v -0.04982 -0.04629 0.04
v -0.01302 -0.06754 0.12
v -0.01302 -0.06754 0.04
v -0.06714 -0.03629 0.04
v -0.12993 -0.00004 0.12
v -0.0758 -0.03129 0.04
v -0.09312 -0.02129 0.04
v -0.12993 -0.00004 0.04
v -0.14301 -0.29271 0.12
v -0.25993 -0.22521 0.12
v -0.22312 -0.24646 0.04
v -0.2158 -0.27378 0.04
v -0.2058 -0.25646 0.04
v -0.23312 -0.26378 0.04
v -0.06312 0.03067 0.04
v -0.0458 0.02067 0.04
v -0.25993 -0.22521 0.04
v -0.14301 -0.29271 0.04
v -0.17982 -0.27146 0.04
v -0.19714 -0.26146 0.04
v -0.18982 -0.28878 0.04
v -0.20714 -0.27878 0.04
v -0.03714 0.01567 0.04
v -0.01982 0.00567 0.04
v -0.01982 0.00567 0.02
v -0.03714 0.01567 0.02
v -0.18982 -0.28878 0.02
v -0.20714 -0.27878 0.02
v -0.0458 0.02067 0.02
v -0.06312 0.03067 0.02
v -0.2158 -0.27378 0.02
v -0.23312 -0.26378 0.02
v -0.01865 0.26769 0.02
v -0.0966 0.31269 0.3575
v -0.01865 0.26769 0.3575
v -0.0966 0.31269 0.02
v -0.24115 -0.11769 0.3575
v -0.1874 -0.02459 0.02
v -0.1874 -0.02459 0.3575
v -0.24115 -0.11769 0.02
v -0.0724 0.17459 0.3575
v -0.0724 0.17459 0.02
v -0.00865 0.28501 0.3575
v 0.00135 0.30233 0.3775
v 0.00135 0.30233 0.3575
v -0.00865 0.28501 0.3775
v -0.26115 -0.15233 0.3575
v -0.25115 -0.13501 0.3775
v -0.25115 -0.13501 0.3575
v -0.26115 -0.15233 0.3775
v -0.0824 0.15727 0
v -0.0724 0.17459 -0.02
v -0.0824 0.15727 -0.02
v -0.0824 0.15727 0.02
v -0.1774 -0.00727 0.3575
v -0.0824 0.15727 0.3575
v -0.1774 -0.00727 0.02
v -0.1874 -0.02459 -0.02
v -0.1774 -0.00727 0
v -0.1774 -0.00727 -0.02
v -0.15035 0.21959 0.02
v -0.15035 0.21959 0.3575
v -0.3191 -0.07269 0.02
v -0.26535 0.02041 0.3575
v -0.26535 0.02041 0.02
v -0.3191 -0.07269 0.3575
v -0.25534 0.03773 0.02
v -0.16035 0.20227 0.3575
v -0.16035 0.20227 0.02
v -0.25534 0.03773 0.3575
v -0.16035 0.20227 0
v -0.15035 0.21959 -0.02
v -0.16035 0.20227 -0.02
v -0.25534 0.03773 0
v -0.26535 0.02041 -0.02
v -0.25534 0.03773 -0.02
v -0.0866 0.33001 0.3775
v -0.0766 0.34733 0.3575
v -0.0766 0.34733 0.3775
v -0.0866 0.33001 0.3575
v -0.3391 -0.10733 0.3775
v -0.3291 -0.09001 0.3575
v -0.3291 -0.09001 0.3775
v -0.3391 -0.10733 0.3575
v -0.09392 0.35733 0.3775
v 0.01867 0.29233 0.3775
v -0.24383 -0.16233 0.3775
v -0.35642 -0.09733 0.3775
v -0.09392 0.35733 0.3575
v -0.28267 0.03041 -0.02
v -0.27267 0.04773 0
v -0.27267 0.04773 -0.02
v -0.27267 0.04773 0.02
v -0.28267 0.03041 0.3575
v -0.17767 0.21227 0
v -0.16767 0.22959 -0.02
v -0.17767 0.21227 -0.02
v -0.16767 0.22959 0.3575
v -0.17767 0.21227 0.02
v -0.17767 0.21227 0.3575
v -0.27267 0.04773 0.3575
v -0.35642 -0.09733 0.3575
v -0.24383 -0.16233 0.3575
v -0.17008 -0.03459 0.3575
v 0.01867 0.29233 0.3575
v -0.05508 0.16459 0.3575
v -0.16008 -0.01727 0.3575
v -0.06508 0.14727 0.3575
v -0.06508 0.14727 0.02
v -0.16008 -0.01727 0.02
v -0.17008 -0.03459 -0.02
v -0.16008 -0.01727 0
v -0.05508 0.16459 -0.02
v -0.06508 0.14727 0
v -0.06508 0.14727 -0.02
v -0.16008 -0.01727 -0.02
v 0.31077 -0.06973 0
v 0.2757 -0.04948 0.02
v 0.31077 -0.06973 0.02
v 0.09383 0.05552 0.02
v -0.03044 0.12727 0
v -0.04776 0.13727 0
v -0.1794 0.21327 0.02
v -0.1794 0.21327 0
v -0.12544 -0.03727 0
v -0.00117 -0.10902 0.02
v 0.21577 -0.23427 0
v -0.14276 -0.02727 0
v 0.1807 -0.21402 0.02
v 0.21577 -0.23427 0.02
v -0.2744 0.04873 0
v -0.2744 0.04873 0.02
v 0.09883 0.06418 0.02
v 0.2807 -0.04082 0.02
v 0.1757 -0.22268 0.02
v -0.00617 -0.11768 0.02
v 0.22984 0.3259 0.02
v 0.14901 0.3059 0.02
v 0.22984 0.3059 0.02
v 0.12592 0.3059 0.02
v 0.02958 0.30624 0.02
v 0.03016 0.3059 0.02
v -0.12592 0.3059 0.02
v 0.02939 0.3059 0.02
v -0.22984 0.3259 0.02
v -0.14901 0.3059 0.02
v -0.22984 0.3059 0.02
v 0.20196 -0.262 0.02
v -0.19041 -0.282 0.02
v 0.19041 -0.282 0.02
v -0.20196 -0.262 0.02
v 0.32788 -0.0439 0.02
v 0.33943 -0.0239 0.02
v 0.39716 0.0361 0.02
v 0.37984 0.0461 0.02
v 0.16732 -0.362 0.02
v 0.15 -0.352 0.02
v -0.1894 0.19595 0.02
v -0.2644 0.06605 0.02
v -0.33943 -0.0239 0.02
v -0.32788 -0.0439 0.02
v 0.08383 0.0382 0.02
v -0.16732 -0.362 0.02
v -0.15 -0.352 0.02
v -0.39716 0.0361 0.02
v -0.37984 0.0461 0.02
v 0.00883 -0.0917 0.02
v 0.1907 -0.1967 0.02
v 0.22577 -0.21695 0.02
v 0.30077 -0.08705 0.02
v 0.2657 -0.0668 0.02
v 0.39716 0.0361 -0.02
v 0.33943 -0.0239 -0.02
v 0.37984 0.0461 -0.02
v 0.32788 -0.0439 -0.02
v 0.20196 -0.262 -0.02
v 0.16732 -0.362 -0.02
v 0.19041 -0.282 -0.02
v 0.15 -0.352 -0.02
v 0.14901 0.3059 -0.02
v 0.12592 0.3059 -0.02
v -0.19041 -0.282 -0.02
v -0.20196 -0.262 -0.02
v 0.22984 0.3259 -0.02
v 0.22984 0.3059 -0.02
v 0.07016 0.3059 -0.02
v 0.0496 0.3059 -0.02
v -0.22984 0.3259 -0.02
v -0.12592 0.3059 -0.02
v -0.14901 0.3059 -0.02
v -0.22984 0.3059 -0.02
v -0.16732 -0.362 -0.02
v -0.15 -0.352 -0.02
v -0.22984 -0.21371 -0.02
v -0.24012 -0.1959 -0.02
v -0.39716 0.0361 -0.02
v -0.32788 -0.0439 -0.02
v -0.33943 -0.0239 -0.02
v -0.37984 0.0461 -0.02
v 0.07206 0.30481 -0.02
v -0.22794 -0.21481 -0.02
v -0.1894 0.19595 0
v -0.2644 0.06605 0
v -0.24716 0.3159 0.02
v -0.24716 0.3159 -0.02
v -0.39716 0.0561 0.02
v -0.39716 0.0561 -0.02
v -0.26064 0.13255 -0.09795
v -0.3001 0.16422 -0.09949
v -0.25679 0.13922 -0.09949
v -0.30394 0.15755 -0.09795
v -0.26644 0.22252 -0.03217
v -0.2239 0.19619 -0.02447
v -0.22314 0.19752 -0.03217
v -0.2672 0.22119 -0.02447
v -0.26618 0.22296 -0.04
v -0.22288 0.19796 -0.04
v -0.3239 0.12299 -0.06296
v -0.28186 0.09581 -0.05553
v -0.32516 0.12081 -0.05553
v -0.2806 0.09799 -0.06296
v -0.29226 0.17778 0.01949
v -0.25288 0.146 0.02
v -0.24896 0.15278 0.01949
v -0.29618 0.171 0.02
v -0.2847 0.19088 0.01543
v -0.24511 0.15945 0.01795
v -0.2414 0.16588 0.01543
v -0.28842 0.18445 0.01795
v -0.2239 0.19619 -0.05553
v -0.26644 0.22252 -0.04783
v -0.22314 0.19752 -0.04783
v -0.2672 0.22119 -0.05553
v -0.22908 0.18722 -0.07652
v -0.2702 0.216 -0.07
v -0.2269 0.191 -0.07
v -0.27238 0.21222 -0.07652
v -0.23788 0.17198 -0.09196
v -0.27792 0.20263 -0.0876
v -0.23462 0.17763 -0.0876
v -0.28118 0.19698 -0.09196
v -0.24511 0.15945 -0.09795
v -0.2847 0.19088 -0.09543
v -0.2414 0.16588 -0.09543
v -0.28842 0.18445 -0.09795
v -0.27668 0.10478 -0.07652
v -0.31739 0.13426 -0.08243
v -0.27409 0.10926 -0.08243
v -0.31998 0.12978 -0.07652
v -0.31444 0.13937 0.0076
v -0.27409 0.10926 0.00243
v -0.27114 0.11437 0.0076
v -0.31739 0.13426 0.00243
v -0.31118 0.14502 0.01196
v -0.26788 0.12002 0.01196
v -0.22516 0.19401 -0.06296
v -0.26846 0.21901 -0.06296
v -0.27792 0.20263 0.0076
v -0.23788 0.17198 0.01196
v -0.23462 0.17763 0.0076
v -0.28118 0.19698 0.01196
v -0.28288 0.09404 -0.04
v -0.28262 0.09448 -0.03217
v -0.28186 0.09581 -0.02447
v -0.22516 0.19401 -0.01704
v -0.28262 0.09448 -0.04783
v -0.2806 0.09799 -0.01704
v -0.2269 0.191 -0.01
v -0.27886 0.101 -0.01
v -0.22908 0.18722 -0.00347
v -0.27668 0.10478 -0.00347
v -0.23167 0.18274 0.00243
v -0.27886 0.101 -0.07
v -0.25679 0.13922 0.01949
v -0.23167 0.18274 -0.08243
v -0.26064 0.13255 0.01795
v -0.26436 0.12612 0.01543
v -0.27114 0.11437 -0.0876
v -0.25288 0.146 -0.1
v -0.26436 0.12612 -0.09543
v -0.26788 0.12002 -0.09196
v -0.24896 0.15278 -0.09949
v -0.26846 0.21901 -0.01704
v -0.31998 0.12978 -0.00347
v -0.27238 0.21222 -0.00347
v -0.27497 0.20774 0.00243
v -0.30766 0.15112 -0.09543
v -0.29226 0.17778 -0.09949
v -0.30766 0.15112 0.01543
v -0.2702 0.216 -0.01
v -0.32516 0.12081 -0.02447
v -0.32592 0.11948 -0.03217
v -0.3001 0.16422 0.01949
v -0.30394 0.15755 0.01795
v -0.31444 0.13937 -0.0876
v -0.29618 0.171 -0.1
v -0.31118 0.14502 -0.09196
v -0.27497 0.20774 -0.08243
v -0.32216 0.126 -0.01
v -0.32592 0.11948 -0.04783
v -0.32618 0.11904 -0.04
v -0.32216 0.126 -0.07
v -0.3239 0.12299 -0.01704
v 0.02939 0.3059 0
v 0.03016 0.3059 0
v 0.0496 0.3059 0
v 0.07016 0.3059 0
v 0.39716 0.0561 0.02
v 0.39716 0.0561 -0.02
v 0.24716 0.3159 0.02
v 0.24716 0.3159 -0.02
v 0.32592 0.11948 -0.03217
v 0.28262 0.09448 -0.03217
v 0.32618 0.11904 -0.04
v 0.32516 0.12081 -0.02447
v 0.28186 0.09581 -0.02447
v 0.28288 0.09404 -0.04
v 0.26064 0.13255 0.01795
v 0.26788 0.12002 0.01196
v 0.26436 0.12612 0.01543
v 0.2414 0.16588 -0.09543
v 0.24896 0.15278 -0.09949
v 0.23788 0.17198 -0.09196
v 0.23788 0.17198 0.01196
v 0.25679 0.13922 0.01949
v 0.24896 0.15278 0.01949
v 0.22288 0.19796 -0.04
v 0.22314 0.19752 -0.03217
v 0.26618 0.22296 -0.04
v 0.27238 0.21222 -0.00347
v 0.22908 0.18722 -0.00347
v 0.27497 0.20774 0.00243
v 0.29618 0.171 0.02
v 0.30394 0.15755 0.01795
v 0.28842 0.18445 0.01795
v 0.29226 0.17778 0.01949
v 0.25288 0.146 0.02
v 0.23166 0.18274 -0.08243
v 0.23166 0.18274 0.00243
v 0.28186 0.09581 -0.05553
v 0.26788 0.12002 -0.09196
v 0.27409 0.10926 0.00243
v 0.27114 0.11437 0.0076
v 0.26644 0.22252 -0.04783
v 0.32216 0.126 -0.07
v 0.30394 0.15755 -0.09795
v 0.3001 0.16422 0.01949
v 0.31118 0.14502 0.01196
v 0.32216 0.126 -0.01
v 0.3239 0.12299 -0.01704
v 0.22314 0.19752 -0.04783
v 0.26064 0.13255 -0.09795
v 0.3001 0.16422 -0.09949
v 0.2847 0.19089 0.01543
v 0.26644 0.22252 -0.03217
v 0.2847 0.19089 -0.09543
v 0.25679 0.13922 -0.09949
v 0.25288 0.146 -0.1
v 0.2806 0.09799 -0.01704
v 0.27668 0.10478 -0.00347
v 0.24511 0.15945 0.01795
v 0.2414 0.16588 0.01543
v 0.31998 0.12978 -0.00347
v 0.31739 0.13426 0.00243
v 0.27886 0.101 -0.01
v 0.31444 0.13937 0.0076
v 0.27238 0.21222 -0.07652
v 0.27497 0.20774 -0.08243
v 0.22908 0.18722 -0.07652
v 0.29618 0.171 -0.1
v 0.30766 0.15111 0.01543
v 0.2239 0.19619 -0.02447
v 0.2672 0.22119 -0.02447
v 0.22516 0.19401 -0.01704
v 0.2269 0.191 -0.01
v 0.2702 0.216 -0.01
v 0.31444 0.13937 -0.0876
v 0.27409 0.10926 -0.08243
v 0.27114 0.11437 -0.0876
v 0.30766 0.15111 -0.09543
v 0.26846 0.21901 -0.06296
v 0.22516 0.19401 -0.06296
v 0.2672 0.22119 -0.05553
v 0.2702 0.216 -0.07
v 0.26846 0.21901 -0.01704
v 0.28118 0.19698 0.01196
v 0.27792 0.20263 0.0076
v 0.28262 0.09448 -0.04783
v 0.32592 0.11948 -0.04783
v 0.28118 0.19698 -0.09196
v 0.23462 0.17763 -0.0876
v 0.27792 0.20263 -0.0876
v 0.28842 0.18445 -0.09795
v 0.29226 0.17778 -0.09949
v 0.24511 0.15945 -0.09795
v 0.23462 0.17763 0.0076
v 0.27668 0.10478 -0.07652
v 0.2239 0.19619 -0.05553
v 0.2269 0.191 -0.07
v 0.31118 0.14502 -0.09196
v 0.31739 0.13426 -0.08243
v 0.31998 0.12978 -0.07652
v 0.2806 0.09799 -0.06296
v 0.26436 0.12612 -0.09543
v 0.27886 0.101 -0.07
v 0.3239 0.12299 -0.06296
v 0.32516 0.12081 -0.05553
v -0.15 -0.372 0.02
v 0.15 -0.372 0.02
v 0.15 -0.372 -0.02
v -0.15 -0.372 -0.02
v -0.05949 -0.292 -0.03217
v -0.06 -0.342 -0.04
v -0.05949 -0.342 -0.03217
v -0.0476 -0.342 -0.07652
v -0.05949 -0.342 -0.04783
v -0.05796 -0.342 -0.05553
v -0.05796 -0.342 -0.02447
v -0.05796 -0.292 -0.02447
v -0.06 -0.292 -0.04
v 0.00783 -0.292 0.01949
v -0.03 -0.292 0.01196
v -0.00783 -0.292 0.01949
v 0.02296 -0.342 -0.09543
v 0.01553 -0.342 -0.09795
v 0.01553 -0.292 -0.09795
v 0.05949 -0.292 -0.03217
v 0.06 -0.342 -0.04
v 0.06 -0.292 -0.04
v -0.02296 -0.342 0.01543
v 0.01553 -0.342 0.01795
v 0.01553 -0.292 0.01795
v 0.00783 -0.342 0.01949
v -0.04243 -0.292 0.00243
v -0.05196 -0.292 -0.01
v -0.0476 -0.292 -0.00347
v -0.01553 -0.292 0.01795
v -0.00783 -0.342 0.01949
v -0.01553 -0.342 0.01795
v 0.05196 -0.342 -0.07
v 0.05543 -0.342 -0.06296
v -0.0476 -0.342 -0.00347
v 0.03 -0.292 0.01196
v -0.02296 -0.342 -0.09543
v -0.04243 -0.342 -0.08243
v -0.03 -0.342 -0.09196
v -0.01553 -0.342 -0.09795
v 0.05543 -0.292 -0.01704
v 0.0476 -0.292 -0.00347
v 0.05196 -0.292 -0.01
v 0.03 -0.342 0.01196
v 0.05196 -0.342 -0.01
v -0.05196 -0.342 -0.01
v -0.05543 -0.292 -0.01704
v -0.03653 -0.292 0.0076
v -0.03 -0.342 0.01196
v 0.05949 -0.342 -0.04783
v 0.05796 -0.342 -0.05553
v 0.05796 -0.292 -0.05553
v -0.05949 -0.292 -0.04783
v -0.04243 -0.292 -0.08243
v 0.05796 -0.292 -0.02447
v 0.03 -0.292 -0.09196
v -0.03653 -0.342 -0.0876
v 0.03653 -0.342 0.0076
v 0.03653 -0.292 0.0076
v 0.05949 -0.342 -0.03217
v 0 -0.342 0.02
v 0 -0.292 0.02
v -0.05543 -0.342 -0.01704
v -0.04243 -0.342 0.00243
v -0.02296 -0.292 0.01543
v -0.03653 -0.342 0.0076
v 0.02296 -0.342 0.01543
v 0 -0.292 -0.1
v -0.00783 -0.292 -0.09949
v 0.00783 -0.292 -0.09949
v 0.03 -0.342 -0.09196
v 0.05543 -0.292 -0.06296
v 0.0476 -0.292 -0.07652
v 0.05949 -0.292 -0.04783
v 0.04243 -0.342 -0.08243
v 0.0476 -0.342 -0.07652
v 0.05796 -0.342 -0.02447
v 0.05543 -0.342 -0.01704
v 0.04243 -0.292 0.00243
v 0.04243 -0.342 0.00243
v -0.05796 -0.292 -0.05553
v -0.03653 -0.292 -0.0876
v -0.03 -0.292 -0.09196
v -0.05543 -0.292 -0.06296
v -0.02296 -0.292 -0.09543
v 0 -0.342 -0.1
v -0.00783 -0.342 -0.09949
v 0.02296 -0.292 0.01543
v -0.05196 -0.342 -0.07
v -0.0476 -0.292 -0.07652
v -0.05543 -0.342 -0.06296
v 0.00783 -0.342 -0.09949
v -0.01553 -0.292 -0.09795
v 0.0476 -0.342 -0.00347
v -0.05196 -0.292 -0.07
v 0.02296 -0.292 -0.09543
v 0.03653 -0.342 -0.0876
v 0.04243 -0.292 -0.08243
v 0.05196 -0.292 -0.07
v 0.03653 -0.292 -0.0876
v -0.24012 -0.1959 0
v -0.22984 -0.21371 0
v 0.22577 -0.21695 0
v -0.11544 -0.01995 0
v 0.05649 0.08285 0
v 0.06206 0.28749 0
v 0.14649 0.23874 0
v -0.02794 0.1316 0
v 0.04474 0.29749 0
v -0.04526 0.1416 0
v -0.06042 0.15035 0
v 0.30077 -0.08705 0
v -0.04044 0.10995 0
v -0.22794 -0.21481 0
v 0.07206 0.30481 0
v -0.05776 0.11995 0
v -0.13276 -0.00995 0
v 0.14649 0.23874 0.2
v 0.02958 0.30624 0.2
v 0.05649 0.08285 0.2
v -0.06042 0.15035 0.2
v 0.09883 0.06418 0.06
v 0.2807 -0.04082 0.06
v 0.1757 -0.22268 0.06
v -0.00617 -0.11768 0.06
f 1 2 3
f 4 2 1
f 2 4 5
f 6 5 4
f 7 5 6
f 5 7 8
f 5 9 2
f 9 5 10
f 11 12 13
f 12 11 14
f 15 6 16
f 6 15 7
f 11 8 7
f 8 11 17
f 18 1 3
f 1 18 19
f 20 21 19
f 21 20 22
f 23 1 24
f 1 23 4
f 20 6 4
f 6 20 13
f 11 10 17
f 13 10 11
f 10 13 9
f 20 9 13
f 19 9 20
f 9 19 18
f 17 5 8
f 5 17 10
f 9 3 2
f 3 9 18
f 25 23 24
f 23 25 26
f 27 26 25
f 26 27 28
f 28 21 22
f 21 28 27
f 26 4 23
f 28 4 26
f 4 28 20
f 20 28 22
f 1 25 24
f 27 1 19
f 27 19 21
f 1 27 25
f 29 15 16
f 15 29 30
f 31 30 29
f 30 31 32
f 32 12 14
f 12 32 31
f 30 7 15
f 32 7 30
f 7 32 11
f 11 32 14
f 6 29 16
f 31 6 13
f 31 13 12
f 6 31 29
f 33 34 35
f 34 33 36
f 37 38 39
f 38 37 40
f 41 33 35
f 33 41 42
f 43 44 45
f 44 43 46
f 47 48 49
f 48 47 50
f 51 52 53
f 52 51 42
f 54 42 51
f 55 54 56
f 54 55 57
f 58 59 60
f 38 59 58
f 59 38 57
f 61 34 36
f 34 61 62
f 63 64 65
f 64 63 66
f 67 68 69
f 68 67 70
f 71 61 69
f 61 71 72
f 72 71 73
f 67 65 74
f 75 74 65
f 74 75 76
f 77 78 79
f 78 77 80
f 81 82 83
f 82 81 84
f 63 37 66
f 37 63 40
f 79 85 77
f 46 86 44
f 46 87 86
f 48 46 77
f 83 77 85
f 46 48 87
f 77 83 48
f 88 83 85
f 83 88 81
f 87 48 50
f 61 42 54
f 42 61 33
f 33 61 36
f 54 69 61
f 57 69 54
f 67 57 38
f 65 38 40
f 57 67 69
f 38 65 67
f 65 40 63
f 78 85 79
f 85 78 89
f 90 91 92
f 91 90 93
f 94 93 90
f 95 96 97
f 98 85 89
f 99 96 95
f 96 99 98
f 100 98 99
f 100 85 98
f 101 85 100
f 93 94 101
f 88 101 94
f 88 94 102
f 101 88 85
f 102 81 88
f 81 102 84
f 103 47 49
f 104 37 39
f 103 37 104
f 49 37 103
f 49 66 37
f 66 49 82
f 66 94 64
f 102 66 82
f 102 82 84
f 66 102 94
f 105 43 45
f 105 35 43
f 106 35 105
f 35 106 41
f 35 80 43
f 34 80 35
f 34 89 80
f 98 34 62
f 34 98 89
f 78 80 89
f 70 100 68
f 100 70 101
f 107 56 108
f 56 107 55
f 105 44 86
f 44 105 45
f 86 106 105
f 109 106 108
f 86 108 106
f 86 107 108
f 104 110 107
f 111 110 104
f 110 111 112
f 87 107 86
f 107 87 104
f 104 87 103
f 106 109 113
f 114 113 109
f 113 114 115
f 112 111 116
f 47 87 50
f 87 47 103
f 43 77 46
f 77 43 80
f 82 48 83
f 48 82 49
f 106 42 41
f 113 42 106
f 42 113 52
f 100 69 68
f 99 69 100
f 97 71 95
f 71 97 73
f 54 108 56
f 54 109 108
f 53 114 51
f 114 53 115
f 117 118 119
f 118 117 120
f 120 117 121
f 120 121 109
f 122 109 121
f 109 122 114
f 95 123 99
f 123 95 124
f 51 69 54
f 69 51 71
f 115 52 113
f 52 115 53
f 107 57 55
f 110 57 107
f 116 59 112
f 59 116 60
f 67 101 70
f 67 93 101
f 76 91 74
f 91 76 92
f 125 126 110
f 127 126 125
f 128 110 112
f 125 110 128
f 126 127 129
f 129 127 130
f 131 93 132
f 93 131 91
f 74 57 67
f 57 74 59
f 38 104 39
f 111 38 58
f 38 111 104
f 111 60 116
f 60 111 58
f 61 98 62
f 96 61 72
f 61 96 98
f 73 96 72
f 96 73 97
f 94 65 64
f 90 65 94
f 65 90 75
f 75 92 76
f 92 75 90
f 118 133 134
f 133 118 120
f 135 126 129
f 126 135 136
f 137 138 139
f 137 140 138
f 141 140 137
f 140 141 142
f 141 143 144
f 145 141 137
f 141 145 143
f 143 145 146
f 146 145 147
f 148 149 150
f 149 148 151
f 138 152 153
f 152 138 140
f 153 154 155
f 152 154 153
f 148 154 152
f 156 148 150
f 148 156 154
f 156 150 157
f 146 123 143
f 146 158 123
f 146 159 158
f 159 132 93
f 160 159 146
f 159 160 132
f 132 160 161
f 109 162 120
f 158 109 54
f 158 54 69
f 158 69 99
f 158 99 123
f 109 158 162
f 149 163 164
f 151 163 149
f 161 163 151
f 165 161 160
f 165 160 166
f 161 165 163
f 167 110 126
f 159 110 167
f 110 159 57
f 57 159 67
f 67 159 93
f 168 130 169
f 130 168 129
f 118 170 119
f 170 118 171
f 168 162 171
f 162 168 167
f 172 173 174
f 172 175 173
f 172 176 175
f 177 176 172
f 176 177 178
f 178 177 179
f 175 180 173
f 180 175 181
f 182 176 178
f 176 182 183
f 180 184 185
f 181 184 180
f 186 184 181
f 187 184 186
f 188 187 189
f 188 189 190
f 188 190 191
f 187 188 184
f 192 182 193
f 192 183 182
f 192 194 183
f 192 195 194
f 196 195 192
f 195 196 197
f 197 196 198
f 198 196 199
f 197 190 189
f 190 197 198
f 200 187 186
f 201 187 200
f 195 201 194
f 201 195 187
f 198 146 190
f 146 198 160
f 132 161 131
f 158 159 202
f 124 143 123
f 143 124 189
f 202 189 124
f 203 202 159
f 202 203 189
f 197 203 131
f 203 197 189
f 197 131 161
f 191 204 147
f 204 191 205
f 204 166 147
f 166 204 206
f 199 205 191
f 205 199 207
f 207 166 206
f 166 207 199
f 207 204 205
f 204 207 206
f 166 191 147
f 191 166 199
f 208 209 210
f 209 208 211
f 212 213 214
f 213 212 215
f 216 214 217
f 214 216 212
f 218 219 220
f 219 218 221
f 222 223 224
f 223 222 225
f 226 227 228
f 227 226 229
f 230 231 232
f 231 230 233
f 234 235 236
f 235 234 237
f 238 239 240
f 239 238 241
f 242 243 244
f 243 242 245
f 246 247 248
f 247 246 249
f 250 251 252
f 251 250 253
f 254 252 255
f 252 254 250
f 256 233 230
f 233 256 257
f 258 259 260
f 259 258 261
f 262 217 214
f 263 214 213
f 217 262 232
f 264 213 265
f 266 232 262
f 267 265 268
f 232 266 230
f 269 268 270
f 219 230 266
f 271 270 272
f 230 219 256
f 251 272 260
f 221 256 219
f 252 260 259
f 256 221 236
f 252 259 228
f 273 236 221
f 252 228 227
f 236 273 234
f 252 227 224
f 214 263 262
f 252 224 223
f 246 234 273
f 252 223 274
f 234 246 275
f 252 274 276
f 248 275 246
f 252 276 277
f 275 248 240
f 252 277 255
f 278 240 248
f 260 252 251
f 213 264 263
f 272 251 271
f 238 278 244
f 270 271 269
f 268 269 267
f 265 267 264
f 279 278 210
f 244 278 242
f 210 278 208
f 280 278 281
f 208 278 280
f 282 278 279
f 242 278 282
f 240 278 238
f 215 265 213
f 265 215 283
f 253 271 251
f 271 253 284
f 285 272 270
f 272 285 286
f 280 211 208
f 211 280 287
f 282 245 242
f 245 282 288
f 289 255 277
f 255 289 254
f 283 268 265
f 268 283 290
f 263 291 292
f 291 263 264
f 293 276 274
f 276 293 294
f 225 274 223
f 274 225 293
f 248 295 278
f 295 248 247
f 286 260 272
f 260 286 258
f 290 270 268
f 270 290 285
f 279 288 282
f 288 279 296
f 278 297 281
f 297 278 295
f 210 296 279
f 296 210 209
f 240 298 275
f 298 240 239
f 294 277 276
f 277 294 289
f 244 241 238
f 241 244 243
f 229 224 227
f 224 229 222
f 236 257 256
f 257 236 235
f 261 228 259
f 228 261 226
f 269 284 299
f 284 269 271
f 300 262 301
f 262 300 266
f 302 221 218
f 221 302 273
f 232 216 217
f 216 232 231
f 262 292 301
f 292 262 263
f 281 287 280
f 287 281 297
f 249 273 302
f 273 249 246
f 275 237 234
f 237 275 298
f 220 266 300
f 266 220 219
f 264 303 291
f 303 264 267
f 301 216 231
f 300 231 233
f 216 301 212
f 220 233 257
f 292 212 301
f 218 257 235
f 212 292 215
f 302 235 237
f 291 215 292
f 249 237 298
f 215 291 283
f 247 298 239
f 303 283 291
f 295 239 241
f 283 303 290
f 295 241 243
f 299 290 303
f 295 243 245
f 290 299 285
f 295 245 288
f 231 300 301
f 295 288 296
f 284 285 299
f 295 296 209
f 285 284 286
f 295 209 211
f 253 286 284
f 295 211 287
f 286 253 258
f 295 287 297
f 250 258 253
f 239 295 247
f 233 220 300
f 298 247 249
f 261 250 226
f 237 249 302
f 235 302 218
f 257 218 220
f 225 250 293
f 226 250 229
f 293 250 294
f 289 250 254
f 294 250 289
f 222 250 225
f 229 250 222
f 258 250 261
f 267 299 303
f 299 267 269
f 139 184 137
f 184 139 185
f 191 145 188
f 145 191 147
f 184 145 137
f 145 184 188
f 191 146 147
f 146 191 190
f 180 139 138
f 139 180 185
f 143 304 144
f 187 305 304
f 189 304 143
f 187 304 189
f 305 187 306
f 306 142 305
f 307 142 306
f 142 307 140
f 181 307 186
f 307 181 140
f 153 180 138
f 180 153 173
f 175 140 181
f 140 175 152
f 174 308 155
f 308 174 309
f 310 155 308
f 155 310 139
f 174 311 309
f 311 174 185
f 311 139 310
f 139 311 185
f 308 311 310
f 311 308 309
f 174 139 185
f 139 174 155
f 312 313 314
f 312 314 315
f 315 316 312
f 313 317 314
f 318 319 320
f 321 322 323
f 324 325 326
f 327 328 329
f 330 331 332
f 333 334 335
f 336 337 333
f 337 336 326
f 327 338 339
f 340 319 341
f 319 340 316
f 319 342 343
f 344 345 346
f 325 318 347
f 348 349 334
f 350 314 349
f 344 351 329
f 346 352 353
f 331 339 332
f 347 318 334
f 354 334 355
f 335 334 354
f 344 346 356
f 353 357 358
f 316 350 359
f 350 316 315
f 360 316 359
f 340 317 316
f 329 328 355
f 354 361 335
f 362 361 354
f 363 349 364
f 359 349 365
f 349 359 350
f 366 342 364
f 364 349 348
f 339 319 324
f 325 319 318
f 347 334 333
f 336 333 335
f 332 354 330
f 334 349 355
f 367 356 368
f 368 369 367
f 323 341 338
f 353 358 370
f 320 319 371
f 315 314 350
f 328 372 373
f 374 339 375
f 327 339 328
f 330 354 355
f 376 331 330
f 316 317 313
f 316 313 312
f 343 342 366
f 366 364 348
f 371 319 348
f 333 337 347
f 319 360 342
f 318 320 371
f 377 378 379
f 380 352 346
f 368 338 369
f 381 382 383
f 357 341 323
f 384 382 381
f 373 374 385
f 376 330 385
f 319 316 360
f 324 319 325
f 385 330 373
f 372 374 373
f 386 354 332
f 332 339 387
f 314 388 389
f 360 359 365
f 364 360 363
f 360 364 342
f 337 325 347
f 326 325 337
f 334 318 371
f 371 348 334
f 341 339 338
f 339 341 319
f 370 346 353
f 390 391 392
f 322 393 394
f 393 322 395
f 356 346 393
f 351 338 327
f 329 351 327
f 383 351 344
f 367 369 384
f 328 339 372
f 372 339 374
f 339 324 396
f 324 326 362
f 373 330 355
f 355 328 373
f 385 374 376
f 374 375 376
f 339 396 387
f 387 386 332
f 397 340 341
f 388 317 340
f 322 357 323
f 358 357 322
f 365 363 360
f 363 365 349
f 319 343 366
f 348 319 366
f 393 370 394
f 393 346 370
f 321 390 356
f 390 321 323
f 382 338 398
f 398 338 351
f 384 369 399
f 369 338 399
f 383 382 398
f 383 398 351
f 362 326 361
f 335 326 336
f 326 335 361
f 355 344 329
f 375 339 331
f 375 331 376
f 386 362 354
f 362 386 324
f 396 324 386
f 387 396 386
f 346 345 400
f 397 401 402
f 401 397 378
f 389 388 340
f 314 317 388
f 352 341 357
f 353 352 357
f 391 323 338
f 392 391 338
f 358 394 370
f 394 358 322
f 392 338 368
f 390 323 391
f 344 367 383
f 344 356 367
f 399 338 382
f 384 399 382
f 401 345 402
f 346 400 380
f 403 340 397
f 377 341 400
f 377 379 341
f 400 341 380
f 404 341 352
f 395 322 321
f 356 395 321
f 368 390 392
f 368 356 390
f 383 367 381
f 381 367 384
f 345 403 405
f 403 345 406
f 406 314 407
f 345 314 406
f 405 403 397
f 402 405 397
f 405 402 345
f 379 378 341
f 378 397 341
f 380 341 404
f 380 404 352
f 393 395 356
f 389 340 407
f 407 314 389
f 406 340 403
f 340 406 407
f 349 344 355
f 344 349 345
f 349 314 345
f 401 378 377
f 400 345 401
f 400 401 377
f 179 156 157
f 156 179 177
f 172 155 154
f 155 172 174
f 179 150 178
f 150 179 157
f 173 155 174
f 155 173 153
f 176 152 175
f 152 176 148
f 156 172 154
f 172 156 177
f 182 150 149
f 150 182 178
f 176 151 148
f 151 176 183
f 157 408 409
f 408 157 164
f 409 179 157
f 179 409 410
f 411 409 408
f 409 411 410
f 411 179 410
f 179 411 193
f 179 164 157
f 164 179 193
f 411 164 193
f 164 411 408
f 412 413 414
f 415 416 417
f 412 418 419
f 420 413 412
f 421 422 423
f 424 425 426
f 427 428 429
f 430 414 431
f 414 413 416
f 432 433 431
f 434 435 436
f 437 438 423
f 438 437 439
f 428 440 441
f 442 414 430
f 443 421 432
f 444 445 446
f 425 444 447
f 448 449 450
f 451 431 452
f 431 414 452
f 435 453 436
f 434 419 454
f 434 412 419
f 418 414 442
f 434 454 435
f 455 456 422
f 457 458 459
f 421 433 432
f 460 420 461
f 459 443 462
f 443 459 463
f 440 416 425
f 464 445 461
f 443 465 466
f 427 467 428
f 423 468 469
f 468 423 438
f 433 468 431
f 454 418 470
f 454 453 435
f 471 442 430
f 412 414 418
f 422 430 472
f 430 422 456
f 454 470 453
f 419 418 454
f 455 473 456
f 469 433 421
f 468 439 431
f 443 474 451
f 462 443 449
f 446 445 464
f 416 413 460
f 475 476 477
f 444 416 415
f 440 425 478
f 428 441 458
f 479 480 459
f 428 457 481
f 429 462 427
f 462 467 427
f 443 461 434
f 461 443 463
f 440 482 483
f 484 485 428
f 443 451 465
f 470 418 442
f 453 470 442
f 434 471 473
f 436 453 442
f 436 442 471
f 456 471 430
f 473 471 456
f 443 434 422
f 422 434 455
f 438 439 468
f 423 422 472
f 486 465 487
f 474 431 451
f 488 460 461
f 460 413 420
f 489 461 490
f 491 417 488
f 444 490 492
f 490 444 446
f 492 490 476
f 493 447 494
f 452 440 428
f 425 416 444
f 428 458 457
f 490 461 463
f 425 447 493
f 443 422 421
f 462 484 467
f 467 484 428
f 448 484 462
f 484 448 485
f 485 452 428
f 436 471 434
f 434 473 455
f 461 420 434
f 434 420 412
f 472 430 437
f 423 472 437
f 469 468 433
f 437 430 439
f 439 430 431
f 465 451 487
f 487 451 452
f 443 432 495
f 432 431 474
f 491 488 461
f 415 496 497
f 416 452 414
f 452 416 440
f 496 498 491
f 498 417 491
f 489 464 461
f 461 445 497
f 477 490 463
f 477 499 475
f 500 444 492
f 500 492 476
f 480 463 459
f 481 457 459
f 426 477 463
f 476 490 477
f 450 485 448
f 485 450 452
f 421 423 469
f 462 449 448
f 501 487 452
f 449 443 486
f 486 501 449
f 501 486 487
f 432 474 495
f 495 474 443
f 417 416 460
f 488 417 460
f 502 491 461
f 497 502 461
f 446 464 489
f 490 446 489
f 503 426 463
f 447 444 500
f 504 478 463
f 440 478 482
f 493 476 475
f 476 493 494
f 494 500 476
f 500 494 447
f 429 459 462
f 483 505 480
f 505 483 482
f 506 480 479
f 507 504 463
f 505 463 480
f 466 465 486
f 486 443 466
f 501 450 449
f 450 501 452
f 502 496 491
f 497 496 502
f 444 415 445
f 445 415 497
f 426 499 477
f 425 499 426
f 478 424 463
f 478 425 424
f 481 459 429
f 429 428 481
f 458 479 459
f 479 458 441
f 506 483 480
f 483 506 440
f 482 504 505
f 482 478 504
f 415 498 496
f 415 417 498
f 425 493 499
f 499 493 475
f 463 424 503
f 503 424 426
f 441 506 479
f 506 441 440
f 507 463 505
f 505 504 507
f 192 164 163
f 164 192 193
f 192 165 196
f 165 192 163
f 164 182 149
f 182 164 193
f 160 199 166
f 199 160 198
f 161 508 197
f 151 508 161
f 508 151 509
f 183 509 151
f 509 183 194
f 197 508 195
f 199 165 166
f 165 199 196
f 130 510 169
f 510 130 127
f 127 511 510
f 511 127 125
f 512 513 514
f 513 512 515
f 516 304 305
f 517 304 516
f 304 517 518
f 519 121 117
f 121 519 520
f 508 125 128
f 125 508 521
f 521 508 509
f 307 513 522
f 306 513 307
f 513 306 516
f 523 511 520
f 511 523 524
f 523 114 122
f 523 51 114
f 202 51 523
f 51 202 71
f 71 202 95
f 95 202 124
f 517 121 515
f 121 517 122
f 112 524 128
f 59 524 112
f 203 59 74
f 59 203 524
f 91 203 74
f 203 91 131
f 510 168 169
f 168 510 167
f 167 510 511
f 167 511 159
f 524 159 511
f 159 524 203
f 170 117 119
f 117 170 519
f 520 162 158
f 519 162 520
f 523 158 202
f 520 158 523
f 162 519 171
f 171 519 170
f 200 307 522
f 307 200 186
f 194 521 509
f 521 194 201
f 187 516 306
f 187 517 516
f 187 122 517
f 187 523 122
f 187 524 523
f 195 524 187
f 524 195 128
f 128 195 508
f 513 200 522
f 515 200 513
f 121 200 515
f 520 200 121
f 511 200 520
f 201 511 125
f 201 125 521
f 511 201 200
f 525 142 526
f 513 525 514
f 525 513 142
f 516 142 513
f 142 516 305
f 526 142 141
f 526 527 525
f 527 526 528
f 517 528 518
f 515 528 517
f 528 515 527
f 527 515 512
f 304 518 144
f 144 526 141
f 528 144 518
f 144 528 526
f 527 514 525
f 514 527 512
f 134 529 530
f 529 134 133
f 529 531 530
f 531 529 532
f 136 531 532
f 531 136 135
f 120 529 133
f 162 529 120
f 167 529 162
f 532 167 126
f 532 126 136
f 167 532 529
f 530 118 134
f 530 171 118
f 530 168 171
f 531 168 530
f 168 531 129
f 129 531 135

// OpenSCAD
// Generated by SolidPython 1.1.3 on 2024-01-29 12:17:45
$fn = 48;


union() {
	rotate(a = [0, 0, 60]) {
		union() {
			color(alpha = 1.0000000000, c = "Red") {
				translate(v = [0.   ,0.272,0.   ]) {
					rotate(a = [0, 0, -0.0000000000]) {
						cube(center = true, size = [0.41547005383792507, 0.0200000000, 0.0400000000]);
					}
				}
			}
		}
		union() {
			color(alpha = 1.0000000000, c = "Orange") {
				translate(v = [0.   ,0.362,0.   ]) {
					rotate(a = [0, 0, -0.0000000000]) {
						cube(center = true, size = [0.3000000000, 0.0200000000, 0.0400000000]);
					}
				}
			}
		}
		union() {
			color(alpha = 1.0000000000, c = "Green") {
				translate(v = [ 0.   , 0.317,-0.04 ]) {
					rotate(a = [90, 0, -0.0000000000]) {
						cylinder(center = true, h = 0.0500000000, r = 0.0600000000);
					}
				}
			}
		}
		union() {
			color(alpha = 1.0000000000, c = "Purple") {
				translate(v = [0.27358073,0.15795191,0.        ]) {
					rotate(a = [0, 0, -60.0000000000]) {
						cube(center = true, size = [0.4596818842642447, 0.0200000000, 0.0400000000]);
					}
				}
			}
		}
		union() {
			color(alpha = 1.0000000000, c = "Red") {
				translate(v = [ 0.23555891,-0.136     , 0.        ]) {
					rotate(a = [0, 0, -120.0000000000]) {
						cube(center = true, size = [0.41547005383792507, 0.0200000000, 0.0400000000]);
					}
				}
			}
		}
		union() {
			color(alpha = 1.0000000000, c = "Orange") {
				translate(v = [ 0.3135012,-0.181    , 0.       ]) {
					rotate(a = [0, 0, -120.0000000000]) {
						cube(center = true, size = [0.3000000000, 0.0200000000, 0.0400000000]);
					}
				}
			}
		}
		union() {
			color(alpha = 1.0000000000, c = "Green") {
				translate(v = [ 0.27453005,-0.1585    ,-0.04      ]) {
					rotate(a = [90, 0, -120.0000000000]) {
						cylinder(center = true, h = 0.0500000000, r = 0.0600000000);
					}
				}
			}
		}
		union() {
			color(alpha = 1.0000000000, c = "Purple") {
				translate(v = [ 3.86870590e-17,-3.15903811e-01, 0.00000000e+00]) {
					rotate(a = [0, 0, -180.0000000000]) {
						cube(center = true, size = [0.4596818842642447, 0.0200000000, 0.0400000000]);
					}
				}
			}
		}
		union() {
			color(alpha = 1.0000000000, c = "Red") {
				translate(v = [-0.23555891,-0.136     , 0.        ]) {
					rotate(a = [0, 0, -240.0000000000]) {
						cube(center = true, size = [0.41547005383792507, 0.0200000000, 0.0400000000]);
					}
				}
			}
		}
		union() {
			color(alpha = 1.0000000000, c = "Orange") {
				translate(v = [-0.3135012,-0.181    , 0.       ]) {
					rotate(a = [0, 0, -240.0000000000]) {
						cube(center = true, size = [0.3000000000, 0.0200000000, 0.0400000000]);
					}
				}
			}
		}
		union() {
			color(alpha = 1.0000000000, c = "Green") {
				translate(v = [-0.27453005,-0.1585    ,-0.04      ]) {
					rotate(a = [90, 0, -240.0000000000]) {
						cylinder(center = true, h = 0.0500000000, r = 0.0600000000);
					}
				}
			}
		}
		union() {
			color(alpha = 1.0000000000, c = "Purple") {
				translate(v = [-0.27358073, 0.15795191, 0.        ]) {
					rotate(a = [0, 0, -300.0000000000]) {
						cube(center = true, size = [0.4596818842642447, 0.0200000000, 0.0400000000]);
					}
				}
			}
		}
		union() {
			color(alpha = 1.0000000000, c = "Blue") {
				translate(v = [-0.0850000000, -0.0200000000, 0.0100000000]) {
					rotate(a = [0, 0, -90]) {
						cube(center = true, size = [0.5680000000, 0.0200000000, 0.0200000000]);
					}
				}
			}
		}
		union() {
			color(alpha = 1.0000000000, c = "Blue") {
				translate(v = [0.0850000000, -0.0200000000, 0.0100000000]) {
					rotate(a = [0, 0, -90]) {
						cube(center = true, size = [0.5680000000, 0.0200000000, 0.0200000000]);
					}
				}
			}
		}
		union() {
			color(alpha = 1.0000000000, c = "Blue") {
				translate(v = [0, 0.1000000000, -0.0100000000]) {
					cube(center = true, size = [0.6000000000, 0.0200000000, 0.0200000000]);
				}
			}
		}
		union() {
			color(alpha = 1.0000000000, c = "Yellow") {
				translate(v = [0.1900000000, 0.0600000000, 0.1000000000]) {
					cube(center = true, size = [0.1800000000, 0.1350000000, 0.2000000000]);
				}
			}
		}
		translate(v = [-0.0550000000, 0.1950000000, 0.0800000000]) {
			rotate(a = [0, 0, 0]) {
				translate(v = [-0.1000000000, -0.1500000000, 0.0000000000]) {
					union() {
						color(alpha = 1.0000000000, c = "Green") {
							translate(v = [-0.0400000000, 0, 0]) {
								cube(center = true, size = [0.2600000000, 0.1350000000, 0.0800000000]);
							}
						}
						color(alpha = 1.0000000000, c = "Blue") {
							translate(v = [-0.0200000000, -0.0150000000, -0.0500000000]) {
								cube(center = true, size = [0.3400000000, 0.0200000000, 0.0200000000]);
							}
						}
						color(alpha = 1.0000000000, c = "Blue") {
							translate(v = [-0.0200000000, 0.0150000000, -0.0500000000]) {
								cube(center = true, size = [0.3400000000, 0.0200000000, 0.0200000000]);
							}
						}
					}
				}
			}
		}
		translate(v = [0, 0.1950000000, 0.1987500000]) {
			rotate(a = [90, 0, 0]) {
				union() {
					color(alpha = 1.0000000000, c = "Yellow") {
						cube(center = true, size = [0.4450000000, 0.3575000000, 0.0900000000]);
					}
					color(alpha = 1.0000000000, c = "Blue") {
						translate(v = [0, 0.1687500000, -0.0550000000]) {
							cube(center = true, size = [0.5250000000, 0.0200000000, 0.0200000000]);
						}
					}
					color(alpha = 1.0000000000, c = "Blue") {
						translate(v = [0, 0.1687500000, 0.0550000000]) {
							cube(center = true, size = [0.5250000000, 0.0200000000, 0.0200000000]);
						}
					}
					color(alpha = 1.0000000000, c = "Blue") {
						translate(v = [0.2325000000, 0.1687500000]) {
							cube(center = true, size = [0.0200000000, 0.0200000000, 0.0900000000]);
						}
					}
					color(alpha = 1.0000000000, c = "Blue") {
						translate(v = [-0.2325000000, 0.1687500000]) {
							cube(center = true, size = [0.0200000000, 0.0200000000, 0.0900000000]);
						}
					}
					color(alpha = 1.0000000000, c = "Blue") {
						translate(v = [0.1050000000, -0.0300000000, 0.0550000000]) {
							cube(center = true, size = [0.0200000000, 0.3775000000, 0.0200000000]);
						}
					}
					color(alpha = 1.0000000000, c = "Blue") {
						translate(v = [-0.1050000000, -0.0300000000, 0.0550000000]) {
							cube(center = true, size = [0.0200000000, 0.3775000000, 0.0200000000]);
						}
					}
					color(alpha = 1.0000000000, c = "Blue") {
						translate(v = [0.1050000000, -0.0300000000, -0.0550000000]) {
							cube(center = true, size = [0.0200000000, 0.3775000000, 0.0200000000]);
						}
					}
					color(alpha = 1.0000000000, c = "Blue") {
						translate(v = [-0.1050000000, -0.0300000000, -0.0550000000]) {
							cube(center = true, size = [0.0200000000, 0.3775000000, 0.0200000000]);
						}
					}
				}
			}
		}
		color(alpha = 1.0000000000, c = "Orange") {
			translate(v = [ 0.    ,-0.1585, 0.04  ]) {
				cube(center = true, size = [0.2100000000, 0.2100000000, 0.0400000000]);
			}
		}
	}
}
/***********************************************
*********      SolidPython code:      **********
************************************************
 
#! /usr/bin/env python3
import sys
import numpy as np
from solid import scad_render_to_file
from solid.objects import cube, translate, union, rotate, color, cylinder
from armComponents2 import controlBox, powerInverter, robotBase

SEGMENTS = 48

radial_vector0 = np.array([31., -19., 0.])
radial_vector0 /= np.linalg.norm(radial_vector0)
radial_vector1 = np.array([-31., -19., 0.])
radial_vector1 /= np.linalg.norm(radial_vector1)

side_count = 3
step_angle = 360/side_count
step_angle_rad = np.deg2rad(step_angle)
rad_size = .3  # Length from center to outer wheel
piece_width = .02  # cm
hpw = piece_width*.5

wheel_gap = .09
ctiw = .352  # Center to inner wheel support
ctow = ctiw-wheel_gap  # Center to outer wheel support
wsl = .3  # Wheel support length

p1 = np.array([wsl*.5, ctiw, 0.])
p2 = np.array([np.sin(step_angle_rad), np.cos(step_angle_rad), 0.]) * ctiw - \
    np.array([np.sin(step_angle_rad+np.pi*.5),
             np.cos(step_angle_rad+np.pi*.5), 0.]) * wsl*.5
boll = np.linalg.norm(p1-p2)  # Big outer lines length
bolr = np.linalg.norm((p1+p2)*.5)  # Big outer lines rad length

# Inner inner wheel support
iiwsl = wsl+((wheel_gap+piece_width*.5) *
             np.tan((side_count*2-2)*np.pi/(side_count*2)-np.pi*.5))*2
print(iiwsl)


def rotate_vec(vec, angle):
    angle = np.deg2rad(angle)
    new_vec = np.copy(vec)
    new_vec[0] = vec[0] * np.cos(angle) - vec[1] * np.sin(angle)
    new_vec[1] = vec[0] * np.sin(angle) + vec[1] * np.cos(angle)
    return new_vec


def basic_geometry():

    shapes = []
    for i in range(side_count):
        dir_vector = np.array(
            [np.sin(i*step_angle_rad), np.cos(i*step_angle_rad), 0.])
        rot = -step_angle*i
        outer_wheel_support = union()(
            color("Red")(
                translate(dir_vector*(ctow+hpw))(
                    rotate((0, 0, rot))(
                        cube([iiwsl, piece_width, piece_width*2], center=True)))))
        shapes.append(outer_wheel_support)
        inner_wheel_support = union()(
            color("Orange")(
                translate(dir_vector*(ctiw+hpw))(
                    rotate((0, 0, rot))(
                        cube([wsl, piece_width, piece_width*2], center=True)))))
        shapes.append(inner_wheel_support)

        # Wheels
        wheel_pos = ((dir_vector*(ctow+hpw))+(dir_vector*(ctiw+hpw)))*.5
        wheel_pos[2] -= .04
        print(wheel_pos)
        wheel = union()(
            color("Green")(
                translate(wheel_pos)(
                    rotate((90, 0, rot))(
                        cylinder(r=.06, h=.05, center=True)))))
        shapes.append(wheel)

        dir_vector = np.array([np.sin(i*step_angle_rad+step_angle_rad*.5),
                              np.cos(i*step_angle_rad+step_angle_rad*.5), 0.])
        rot -= step_angle*.5
        big_outer_line = union()(
            color("Purple")(
                translate(dir_vector*(bolr+hpw))(
                    rotate((0, 0, rot))(
                        cube([boll, piece_width, piece_width*2], center=True)))))
        shapes.append(big_outer_line)

    vertical_bar1 = union()(
        color("Blue")(
            translate([-.085, -.02, .01])(
                rotate((0, 0, -90))(
                    cube([.568, piece_width, piece_width], center=True)))))
    shapes.append(vertical_bar1)

    vertical_bar2 = union()(
        color("Blue")(
            translate([.085, -.02, .01])(
                rotate((0, 0, -90))(
                    cube([.568, piece_width, piece_width], center=True)))))
    shapes.append(vertical_bar2)

    horizontal_bar = union()(
        color("Blue")(
            translate([0, .1, -.01])(
                cube([.6, piece_width, piece_width], center=True))))
    shapes.append(horizontal_bar)

    battery_pack = union()(
        color("Yellow")(
            translate([.19, .06, .1])(
                    cube([.18, .135, .2], center=True))))
    shapes.append(battery_pack)
    
    power_inverter = powerInverter()
    power_inverter = translate([-.055, .195, .02+.06])(power_inverter)
    shapes.append(power_inverter)
    
    control_box = controlBox()
    control_box = translate([0, .195, .02+.3575*.5])(rotate([90, 0, 0])(control_box))
    shapes.append(control_box)

    robot_base = robotBase()
    shapes.append(robot_base)

    return union()(rotate([0, 0, 60])(*shapes))


if __name__ == '__main__':
    out_dir = sys.argv[1] if len(sys.argv) > 1 else None

    a = basic_geometry()

    # Adding the file_header argument as shown allows you to change
    # the detail of arcs by changing the SEGMENTS variable.  This can
    # be expensive when making lots of small curves, but is otherwise
    # useful.
    file_out = scad_render_to_file(
        a, out_dir=out_dir, file_header=f'$fn = {SEGMENTS};')
    print(f"{__file__}: SCAD file written to: \n{file_out}")
 
 
************************************************/
